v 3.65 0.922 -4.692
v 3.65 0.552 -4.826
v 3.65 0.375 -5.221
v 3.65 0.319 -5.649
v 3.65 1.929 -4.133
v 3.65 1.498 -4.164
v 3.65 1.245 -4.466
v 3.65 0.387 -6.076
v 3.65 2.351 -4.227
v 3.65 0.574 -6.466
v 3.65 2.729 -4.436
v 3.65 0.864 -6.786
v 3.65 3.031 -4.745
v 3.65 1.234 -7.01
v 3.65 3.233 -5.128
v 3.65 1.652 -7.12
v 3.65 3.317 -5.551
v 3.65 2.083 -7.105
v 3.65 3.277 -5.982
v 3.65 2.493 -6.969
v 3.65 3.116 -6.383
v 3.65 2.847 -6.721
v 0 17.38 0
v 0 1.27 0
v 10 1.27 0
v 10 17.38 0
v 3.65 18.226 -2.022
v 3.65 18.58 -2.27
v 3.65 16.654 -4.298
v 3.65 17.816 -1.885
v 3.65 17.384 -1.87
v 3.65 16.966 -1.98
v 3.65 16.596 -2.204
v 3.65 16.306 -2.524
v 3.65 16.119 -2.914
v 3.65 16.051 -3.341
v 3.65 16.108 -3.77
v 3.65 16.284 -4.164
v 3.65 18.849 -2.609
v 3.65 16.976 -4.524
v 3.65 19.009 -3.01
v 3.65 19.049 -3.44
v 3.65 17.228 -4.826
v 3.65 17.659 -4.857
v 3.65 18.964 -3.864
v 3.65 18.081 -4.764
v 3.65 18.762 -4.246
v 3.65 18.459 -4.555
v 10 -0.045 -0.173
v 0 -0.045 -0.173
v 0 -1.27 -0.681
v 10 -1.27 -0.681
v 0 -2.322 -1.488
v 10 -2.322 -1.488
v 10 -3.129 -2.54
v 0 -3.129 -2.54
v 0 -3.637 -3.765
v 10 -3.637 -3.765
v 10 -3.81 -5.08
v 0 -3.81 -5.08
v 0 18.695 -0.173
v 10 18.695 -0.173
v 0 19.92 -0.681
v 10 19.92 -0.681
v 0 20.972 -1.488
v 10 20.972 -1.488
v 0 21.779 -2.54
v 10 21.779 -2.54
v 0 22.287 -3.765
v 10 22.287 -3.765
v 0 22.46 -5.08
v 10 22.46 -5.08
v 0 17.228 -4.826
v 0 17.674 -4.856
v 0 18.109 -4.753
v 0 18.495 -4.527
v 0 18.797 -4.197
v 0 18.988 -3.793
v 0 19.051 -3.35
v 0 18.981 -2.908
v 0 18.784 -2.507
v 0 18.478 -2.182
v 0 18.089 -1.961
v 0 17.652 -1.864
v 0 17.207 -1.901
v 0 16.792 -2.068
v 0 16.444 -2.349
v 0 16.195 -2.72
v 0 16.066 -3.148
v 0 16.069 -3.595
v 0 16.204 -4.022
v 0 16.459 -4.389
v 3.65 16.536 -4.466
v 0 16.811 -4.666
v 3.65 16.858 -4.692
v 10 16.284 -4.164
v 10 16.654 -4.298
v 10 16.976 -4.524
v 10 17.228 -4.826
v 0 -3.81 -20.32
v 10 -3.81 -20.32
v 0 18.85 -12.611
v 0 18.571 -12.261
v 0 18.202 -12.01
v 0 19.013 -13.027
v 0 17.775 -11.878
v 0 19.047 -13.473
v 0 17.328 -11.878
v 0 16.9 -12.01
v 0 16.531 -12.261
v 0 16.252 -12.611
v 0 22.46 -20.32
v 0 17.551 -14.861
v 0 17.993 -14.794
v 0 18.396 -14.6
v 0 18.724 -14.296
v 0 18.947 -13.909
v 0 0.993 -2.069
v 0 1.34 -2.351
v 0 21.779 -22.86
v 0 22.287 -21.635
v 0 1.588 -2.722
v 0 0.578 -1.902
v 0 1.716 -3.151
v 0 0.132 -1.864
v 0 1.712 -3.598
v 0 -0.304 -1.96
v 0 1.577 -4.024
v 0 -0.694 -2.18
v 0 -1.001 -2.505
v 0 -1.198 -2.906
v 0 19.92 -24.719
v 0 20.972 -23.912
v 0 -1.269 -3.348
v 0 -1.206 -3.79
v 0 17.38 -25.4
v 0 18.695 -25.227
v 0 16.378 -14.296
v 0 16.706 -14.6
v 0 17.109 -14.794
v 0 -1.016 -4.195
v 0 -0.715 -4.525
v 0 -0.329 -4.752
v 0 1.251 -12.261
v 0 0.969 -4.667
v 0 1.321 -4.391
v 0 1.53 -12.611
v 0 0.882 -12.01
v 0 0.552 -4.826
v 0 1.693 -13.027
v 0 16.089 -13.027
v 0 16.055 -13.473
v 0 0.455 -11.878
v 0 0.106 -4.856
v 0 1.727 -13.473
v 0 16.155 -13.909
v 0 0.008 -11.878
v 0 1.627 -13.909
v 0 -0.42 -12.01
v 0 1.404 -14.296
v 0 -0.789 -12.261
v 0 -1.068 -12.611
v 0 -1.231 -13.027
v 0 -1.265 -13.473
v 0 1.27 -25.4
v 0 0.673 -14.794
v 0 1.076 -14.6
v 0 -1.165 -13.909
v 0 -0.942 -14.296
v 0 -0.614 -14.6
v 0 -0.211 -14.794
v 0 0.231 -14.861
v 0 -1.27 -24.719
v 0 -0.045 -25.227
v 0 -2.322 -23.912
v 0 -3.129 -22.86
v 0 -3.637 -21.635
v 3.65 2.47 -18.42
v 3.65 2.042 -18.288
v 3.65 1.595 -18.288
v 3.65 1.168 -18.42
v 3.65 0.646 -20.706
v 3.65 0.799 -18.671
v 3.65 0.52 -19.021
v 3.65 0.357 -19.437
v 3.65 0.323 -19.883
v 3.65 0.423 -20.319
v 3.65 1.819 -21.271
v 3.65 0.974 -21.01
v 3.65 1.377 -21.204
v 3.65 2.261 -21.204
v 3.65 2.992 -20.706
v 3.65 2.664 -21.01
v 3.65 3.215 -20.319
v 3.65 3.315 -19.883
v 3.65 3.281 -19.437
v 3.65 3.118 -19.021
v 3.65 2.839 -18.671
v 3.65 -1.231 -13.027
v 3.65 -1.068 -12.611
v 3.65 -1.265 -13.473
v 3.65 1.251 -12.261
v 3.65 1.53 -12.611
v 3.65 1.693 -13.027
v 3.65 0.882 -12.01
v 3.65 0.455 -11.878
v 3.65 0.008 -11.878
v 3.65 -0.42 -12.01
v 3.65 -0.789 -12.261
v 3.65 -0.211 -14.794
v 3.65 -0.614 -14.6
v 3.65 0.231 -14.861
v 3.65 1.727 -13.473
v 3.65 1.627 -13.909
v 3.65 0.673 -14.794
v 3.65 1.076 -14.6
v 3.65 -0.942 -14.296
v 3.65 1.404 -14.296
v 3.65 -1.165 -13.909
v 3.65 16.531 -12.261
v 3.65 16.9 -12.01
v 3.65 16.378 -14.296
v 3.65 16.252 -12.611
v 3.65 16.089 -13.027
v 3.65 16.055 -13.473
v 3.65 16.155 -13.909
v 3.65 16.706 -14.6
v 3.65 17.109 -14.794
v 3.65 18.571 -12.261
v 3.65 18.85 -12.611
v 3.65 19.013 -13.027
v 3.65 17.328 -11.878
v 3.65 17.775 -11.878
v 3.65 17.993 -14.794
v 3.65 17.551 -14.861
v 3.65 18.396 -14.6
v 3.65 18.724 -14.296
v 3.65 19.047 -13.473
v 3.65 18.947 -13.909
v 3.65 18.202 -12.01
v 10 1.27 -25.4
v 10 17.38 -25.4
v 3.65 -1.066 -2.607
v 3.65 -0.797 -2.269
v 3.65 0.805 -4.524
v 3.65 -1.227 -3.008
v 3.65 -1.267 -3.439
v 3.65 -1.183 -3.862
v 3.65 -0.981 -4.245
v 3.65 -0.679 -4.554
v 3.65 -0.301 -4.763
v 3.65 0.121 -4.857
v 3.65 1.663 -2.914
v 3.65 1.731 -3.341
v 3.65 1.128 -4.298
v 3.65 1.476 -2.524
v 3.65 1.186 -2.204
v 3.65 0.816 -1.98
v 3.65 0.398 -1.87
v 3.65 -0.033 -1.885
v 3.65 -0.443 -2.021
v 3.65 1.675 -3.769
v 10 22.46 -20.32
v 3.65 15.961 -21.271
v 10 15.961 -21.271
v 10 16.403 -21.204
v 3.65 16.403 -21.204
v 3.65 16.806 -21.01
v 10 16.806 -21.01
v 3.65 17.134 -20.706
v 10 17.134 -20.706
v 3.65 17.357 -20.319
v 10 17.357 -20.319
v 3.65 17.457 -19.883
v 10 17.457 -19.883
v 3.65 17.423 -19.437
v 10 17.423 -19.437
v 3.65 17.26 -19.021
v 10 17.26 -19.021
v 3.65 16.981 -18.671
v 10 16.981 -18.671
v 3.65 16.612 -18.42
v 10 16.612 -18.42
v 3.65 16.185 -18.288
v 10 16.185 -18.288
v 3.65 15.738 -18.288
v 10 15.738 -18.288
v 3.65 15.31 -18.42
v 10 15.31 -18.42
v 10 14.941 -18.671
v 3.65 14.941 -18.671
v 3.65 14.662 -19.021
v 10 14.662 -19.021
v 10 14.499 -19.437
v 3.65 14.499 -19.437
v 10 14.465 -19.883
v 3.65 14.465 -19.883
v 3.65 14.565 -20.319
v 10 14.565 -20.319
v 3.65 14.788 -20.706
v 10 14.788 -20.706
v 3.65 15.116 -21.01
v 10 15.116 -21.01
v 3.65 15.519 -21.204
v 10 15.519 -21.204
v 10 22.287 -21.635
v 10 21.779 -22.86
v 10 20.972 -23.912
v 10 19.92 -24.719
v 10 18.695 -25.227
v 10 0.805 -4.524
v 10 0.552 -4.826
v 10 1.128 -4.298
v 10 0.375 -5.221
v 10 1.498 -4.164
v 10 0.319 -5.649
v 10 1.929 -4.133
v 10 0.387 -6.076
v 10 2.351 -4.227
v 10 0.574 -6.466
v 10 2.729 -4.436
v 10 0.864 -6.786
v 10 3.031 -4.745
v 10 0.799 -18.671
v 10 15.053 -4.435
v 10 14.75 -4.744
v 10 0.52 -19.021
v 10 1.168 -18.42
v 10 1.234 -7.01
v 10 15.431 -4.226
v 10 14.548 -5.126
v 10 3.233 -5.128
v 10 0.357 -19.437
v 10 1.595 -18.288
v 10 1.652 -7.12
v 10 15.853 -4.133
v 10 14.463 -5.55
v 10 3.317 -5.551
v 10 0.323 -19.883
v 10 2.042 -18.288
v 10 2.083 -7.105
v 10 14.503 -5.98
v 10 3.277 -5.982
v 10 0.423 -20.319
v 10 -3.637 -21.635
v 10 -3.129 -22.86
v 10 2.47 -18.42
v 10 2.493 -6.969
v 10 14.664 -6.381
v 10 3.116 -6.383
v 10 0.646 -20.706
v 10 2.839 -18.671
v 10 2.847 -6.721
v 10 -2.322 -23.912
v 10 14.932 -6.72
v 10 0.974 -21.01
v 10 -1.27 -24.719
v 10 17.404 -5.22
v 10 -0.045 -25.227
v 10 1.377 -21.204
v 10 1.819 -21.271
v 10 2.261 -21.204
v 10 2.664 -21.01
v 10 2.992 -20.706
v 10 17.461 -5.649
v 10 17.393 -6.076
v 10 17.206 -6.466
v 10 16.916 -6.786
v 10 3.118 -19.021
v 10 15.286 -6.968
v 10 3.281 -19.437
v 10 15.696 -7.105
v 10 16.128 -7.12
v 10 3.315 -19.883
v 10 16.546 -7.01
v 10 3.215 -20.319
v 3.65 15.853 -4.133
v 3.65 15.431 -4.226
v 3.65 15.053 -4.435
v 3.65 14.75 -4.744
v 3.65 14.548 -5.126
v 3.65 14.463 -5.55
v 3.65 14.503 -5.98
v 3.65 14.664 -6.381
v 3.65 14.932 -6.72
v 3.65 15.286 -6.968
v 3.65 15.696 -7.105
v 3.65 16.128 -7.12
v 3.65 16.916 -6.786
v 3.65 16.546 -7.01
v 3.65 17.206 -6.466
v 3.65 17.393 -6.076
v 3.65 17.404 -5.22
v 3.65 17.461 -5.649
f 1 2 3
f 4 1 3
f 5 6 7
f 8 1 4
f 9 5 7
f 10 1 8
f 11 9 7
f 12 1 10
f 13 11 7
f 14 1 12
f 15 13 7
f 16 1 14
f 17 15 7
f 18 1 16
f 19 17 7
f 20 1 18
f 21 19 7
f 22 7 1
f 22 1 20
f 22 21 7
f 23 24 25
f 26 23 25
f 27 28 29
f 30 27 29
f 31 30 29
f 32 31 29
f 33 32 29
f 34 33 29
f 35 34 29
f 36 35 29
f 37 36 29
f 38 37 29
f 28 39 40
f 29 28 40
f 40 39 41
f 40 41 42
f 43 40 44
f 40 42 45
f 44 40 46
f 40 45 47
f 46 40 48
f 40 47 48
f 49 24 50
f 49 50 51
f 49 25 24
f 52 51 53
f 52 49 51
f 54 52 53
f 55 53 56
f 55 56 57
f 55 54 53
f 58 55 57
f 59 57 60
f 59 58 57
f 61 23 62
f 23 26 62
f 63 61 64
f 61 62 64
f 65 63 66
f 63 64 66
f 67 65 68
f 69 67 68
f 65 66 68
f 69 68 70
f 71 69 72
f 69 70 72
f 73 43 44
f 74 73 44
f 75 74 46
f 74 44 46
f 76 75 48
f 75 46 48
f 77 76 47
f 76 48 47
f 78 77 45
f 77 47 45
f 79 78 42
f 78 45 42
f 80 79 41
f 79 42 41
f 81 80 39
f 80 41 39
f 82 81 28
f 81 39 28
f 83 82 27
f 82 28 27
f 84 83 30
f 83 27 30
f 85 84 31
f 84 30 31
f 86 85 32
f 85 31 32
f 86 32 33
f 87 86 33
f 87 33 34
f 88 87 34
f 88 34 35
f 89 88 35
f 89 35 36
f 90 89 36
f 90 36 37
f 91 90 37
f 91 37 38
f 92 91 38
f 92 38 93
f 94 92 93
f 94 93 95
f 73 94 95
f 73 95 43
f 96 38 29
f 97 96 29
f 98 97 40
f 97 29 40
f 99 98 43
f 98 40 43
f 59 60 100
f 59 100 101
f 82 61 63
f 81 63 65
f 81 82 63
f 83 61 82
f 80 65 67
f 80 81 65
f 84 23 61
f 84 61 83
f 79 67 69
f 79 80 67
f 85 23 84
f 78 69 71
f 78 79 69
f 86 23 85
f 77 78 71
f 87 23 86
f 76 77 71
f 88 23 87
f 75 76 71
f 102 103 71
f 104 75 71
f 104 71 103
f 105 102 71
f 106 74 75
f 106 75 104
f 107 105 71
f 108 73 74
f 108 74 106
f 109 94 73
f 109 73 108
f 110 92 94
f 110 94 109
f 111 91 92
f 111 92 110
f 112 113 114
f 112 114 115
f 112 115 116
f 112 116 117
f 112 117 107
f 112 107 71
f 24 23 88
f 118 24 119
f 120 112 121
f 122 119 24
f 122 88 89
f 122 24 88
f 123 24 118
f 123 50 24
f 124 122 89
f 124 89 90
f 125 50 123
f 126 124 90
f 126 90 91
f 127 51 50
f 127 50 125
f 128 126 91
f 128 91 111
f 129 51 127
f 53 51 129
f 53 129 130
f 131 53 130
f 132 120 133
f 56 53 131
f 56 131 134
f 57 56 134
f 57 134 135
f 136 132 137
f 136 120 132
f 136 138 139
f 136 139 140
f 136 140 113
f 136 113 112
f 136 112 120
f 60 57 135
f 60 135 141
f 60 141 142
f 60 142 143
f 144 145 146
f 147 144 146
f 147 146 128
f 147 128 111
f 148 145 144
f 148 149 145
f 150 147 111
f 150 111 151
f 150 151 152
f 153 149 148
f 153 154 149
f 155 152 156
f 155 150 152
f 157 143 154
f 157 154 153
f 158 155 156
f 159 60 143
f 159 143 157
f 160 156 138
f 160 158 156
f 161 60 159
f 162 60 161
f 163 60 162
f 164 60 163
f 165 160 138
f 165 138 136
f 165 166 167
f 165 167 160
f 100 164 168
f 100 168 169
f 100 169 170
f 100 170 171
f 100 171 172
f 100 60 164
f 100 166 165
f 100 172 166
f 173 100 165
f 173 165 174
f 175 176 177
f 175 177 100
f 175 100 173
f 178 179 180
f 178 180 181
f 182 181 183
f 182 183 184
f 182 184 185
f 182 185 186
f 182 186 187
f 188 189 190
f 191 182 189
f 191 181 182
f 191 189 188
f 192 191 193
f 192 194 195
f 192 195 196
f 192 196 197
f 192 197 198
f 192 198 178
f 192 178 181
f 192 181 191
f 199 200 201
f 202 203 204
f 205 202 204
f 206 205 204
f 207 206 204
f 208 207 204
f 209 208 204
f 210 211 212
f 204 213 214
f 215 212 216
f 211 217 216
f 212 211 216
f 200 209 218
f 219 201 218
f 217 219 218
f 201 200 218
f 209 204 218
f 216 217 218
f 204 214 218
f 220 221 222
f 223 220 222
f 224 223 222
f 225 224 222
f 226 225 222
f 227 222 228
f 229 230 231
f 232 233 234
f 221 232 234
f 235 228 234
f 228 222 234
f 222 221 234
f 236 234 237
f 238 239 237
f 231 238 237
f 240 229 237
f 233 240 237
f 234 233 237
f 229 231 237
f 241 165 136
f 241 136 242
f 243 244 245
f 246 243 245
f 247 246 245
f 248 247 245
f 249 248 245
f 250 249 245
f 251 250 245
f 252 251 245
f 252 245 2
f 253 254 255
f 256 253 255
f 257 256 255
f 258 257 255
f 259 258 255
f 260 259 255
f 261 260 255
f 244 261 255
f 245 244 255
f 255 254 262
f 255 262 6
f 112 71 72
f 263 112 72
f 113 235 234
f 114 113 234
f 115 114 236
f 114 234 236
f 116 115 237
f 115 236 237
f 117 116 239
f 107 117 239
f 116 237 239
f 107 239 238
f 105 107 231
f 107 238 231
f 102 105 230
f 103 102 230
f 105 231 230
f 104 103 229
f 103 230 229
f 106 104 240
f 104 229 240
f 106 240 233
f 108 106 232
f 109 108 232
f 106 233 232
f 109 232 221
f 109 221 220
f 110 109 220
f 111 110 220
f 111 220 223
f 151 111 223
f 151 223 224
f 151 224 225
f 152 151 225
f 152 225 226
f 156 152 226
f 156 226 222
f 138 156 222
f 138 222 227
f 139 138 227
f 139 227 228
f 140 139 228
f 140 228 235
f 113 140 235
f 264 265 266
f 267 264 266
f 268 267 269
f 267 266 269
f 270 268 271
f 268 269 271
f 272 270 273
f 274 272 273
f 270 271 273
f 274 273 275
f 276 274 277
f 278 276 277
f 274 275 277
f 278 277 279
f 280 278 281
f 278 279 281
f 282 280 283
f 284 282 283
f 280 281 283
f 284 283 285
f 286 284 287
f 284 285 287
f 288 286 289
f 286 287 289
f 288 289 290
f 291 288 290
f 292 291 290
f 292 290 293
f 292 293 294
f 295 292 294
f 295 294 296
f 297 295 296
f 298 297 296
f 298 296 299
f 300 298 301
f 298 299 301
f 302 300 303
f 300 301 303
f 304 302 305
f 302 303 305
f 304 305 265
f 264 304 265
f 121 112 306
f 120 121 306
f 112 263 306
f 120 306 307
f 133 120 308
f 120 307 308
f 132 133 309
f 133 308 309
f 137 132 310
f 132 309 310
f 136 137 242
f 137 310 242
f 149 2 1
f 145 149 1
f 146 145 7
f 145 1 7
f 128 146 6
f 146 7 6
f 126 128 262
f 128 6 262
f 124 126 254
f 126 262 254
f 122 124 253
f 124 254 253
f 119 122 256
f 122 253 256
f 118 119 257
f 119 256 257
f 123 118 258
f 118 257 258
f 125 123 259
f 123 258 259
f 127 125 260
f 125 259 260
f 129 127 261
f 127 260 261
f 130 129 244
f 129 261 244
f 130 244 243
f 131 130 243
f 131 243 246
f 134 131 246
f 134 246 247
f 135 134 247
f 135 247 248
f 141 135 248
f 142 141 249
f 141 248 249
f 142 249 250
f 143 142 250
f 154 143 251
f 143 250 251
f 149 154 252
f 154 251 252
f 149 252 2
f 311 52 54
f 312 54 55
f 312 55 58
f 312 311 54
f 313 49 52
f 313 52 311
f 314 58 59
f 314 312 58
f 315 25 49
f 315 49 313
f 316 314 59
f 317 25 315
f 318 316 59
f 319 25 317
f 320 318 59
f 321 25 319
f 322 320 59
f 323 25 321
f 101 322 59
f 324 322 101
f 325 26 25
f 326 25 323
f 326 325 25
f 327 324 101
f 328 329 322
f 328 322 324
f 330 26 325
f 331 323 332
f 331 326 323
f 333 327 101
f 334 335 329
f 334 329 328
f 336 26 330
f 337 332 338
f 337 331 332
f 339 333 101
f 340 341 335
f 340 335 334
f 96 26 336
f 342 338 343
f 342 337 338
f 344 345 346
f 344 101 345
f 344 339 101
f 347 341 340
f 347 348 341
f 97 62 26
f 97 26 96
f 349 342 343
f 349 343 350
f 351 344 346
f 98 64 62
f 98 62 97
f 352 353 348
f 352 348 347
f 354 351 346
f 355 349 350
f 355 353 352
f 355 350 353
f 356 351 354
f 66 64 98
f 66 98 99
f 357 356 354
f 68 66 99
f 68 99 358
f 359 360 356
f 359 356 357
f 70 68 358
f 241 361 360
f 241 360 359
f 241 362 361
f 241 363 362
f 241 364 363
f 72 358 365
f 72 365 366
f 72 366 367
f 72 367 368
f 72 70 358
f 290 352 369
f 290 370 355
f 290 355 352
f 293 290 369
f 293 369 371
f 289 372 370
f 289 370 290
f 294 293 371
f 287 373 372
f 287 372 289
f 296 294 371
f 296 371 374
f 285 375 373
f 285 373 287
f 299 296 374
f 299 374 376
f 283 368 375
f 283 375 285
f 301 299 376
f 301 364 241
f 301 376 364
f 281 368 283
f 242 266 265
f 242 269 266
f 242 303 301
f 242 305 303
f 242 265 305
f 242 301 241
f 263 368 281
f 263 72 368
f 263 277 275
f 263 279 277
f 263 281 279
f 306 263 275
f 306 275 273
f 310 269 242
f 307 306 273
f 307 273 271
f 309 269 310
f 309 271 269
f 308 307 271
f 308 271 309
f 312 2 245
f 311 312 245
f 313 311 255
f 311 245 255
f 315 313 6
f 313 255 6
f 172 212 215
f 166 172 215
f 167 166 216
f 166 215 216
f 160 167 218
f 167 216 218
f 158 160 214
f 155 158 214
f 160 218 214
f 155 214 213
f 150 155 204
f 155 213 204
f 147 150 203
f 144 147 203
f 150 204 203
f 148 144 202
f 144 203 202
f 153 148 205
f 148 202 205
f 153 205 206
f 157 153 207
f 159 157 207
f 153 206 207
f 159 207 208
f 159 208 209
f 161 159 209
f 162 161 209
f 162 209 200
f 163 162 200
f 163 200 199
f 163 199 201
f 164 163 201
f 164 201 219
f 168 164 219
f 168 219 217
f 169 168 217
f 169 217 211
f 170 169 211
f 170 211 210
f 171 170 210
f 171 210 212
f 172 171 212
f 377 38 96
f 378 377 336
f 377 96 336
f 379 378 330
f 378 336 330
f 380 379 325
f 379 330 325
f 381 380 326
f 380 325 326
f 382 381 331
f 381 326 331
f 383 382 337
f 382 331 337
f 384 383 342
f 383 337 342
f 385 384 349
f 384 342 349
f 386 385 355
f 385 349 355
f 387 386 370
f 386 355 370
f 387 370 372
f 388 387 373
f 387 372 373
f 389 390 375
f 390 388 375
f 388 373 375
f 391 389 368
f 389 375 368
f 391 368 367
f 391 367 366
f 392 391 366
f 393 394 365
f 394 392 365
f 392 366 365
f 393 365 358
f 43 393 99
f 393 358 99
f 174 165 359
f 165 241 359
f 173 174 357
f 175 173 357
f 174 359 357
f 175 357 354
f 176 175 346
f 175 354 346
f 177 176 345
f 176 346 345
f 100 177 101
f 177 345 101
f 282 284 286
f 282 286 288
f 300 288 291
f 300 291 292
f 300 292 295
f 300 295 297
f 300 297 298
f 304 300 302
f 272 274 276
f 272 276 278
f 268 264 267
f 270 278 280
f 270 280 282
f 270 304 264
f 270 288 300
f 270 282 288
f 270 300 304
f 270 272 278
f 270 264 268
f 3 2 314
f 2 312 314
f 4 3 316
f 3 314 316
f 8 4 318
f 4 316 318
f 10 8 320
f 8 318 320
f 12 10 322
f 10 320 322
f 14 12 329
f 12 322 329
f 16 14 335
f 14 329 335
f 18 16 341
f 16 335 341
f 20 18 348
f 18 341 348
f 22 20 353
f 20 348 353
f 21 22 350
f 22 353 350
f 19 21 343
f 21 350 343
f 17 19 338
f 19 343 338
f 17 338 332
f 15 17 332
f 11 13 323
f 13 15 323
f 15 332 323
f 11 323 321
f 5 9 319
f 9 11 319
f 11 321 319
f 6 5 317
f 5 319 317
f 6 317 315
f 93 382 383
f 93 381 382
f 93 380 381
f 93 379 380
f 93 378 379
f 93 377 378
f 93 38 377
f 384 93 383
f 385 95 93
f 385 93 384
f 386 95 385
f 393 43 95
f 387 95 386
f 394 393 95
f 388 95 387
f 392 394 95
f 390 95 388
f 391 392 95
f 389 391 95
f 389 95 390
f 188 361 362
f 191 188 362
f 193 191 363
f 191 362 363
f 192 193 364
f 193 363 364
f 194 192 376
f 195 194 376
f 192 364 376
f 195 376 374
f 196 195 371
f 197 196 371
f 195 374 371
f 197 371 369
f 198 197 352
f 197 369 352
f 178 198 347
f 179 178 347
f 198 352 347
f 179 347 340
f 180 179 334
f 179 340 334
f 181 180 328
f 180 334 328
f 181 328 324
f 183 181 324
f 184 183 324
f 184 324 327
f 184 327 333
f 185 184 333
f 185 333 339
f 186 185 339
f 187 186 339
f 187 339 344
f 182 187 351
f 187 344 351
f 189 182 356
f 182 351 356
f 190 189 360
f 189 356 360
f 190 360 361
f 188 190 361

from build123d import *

# Parameters (mm, degrees)
BOSS_EXTRUDE1_DEPTH      = 22.46
BOSS_EXTRUDE1_DEPTH_BACK = 3.81
SKETCH1_W                = 10
SKETCH1_H                = 25.4
SKETCH4_R                = 1.5
CUT_EXTRUDE1_DEPTH       = 6.35
SKETCH5_R                = 1.5
CUT_EXTRUDE2_DEPTH       = 250
SKETCH5_3_R              = 1.5
BOSS_EXTRUDE2_DEPTH      = 6.35
FILLET1_R                = 5.08


with BuildPart() as part:
    # Sketch1 → Boss-Extrude1 (new, two sides: drawn at the far end of the back side and taken through both)
    with BuildSketch(Plane(origin=(0, 0, 0), x_dir=(1, 0, 0), z_dir=(0, 1, 0)).offset(-BOSS_EXTRUDE1_DEPTH_BACK)):
        with Locations((5, 12.7)):
            Rectangle(SKETCH1_W, SKETCH1_H)
    extrude(amount=BOSS_EXTRUDE1_DEPTH + BOSS_EXTRUDE1_DEPTH_BACK)

    # Sketch4 → Cut-Extrude1 (cut)
    with BuildSketch(Plane(origin=(10, 0, 0), x_dir=(0, 0, -1), z_dir=(1, 0, 0))):
        with Locations((19.771067812, 1.818932188)):
            Circle(SKETCH4_R)
        with Locations((5.628932188, 1.818932188)):
            Circle(SKETCH4_R)
        with Locations((5.628932188, 15.961067812)):
            Circle(SKETCH4_R)
        with Locations((19.771067812, 15.961067812)):
            Circle(SKETCH4_R)
    extrude(amount=-CUT_EXTRUDE1_DEPTH, mode=Mode.SUBTRACT)

    # Sketch5 → Cut-Extrude2 (cut)
    with BuildSketch(Plane(origin=(10, 0, 0), x_dir=(0, 0, -1), z_dir=(1, 0, 0))):
        with Locations((13.361067812, 17.551067934)):
            Circle(SKETCH5_R)
        with Locations((3.361067812, 17.551067934)):
            Circle(SKETCH5_R)
        with Locations((3.361067812, 0.231067934)):
            Circle(SKETCH5_R)
        with Locations((13.361067812, 0.231067934)):
            Circle(SKETCH5_R)
    extrude(amount=-CUT_EXTRUDE2_DEPTH, mode=Mode.SUBTRACT)

    # Sketch5<3> → Boss-Extrude2 (add)
    with BuildSketch(Plane(origin=(10, 0, 0), x_dir=(0, 0, -1), z_dir=(1, 0, 0))):
        with Locations((13.361067812, 17.551067934)):
            Circle(SKETCH5_3_R)
        with BuildLine():
            ThreePointArc((4.825860086, 17.227983436), (2.421553774, 18.720389692), (3.361067812, 16.051067934))
            ThreePointArc((3.361067812, 16.051067934), (3.779174595, 16.110517095), (4.164139914, 16.284152309))
            ThreePointArc((4.164139914, 16.284152309), (4.40071946, 16.822167977), (4.825860086, 17.227983436))
        make_face()
        with BuildLine():
            ThreePointArc((4.826405156, 0.551671219), (4.400175744, 0.958608063), (4.163594844, 1.498328903))
            ThreePointArc((4.163594844, 1.498328903), (2.132311367, -0.629256191), (4.826405156, 0.551671219))
        make_face()
        with Locations((13.361067812, 0.231067934)):
            Circle(SKETCH5_3_R)
    extrude(amount=-BOSS_EXTRUDE2_DEPTH)

    # Fillet1
    fillet1_edges = [part.edges().sort_by_distance(p)[0] for p in [
        (5, 22.46, 0),
        (5, 22.46, -25.4),
        (5, -3.81, -25.4),
        (5, -3.81, 0),
    ]]
    fillet(fillet1_edges, radius=FILLET1_R)


solid = part.part
